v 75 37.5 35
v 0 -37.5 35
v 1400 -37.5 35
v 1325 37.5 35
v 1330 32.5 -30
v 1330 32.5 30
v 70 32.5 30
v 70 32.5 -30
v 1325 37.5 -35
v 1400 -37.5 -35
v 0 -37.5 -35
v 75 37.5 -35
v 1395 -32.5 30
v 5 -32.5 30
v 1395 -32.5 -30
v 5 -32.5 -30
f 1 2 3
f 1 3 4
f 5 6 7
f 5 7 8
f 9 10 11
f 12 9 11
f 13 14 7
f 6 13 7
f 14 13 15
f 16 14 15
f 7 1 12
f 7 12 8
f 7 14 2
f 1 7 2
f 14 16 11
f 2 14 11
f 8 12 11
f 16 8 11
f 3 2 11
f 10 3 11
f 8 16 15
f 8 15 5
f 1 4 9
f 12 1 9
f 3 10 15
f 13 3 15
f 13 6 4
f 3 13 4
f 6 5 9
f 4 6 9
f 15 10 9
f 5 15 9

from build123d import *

# Parameters (mm, degrees)
SKETCH_2_W          = 70
SKETCH_2_H          = 75
SKETCH_2_W_2        = 60
SKETCH_2_H_2        = 65
EXTRUDE_1_DEPTH     = 1400
SKETCH_3_OUTSIDE_W  = 1682.75
SKETCH_3_OUTSIDE_H  = 357.75
CUT_EXTRUDE_1_DEPTH = 71


with BuildPart() as part:
    # Эскиз2 → Вытянуть-Тонкостенный1 (new body)
    with BuildSketch(Plane(origin=(0, 0, 0), x_dir=(0, 0, -1), z_dir=(1, 0, 0))):
        Rectangle(SKETCH_2_W, SKETCH_2_H)
        Rectangle(SKETCH_2_W_2, SKETCH_2_H_2, mode=Mode.SUBTRACT)
    extrude(amount=EXTRUDE_1_DEPTH)

    # Эскиз3 outside → Вырез-Вытянуть1 (cut, through all)
    with BuildSketch(Plane(origin=(0, 0, -35), x_dir=(-1, 0, 0), z_dir=(0, 0, -1))):
        with Locations((-700, 0)):
            Rectangle(SKETCH_3_OUTSIDE_W, SKETCH_3_OUTSIDE_H)
        Polygon((-1400, -37.5), (-1325, 37.5), (-75, 37.5), (0, -37.5), align=None, mode=Mode.SUBTRACT)
    extrude(amount=-CUT_EXTRUDE_1_DEPTH, mode=Mode.SUBTRACT)


solid = part.part
